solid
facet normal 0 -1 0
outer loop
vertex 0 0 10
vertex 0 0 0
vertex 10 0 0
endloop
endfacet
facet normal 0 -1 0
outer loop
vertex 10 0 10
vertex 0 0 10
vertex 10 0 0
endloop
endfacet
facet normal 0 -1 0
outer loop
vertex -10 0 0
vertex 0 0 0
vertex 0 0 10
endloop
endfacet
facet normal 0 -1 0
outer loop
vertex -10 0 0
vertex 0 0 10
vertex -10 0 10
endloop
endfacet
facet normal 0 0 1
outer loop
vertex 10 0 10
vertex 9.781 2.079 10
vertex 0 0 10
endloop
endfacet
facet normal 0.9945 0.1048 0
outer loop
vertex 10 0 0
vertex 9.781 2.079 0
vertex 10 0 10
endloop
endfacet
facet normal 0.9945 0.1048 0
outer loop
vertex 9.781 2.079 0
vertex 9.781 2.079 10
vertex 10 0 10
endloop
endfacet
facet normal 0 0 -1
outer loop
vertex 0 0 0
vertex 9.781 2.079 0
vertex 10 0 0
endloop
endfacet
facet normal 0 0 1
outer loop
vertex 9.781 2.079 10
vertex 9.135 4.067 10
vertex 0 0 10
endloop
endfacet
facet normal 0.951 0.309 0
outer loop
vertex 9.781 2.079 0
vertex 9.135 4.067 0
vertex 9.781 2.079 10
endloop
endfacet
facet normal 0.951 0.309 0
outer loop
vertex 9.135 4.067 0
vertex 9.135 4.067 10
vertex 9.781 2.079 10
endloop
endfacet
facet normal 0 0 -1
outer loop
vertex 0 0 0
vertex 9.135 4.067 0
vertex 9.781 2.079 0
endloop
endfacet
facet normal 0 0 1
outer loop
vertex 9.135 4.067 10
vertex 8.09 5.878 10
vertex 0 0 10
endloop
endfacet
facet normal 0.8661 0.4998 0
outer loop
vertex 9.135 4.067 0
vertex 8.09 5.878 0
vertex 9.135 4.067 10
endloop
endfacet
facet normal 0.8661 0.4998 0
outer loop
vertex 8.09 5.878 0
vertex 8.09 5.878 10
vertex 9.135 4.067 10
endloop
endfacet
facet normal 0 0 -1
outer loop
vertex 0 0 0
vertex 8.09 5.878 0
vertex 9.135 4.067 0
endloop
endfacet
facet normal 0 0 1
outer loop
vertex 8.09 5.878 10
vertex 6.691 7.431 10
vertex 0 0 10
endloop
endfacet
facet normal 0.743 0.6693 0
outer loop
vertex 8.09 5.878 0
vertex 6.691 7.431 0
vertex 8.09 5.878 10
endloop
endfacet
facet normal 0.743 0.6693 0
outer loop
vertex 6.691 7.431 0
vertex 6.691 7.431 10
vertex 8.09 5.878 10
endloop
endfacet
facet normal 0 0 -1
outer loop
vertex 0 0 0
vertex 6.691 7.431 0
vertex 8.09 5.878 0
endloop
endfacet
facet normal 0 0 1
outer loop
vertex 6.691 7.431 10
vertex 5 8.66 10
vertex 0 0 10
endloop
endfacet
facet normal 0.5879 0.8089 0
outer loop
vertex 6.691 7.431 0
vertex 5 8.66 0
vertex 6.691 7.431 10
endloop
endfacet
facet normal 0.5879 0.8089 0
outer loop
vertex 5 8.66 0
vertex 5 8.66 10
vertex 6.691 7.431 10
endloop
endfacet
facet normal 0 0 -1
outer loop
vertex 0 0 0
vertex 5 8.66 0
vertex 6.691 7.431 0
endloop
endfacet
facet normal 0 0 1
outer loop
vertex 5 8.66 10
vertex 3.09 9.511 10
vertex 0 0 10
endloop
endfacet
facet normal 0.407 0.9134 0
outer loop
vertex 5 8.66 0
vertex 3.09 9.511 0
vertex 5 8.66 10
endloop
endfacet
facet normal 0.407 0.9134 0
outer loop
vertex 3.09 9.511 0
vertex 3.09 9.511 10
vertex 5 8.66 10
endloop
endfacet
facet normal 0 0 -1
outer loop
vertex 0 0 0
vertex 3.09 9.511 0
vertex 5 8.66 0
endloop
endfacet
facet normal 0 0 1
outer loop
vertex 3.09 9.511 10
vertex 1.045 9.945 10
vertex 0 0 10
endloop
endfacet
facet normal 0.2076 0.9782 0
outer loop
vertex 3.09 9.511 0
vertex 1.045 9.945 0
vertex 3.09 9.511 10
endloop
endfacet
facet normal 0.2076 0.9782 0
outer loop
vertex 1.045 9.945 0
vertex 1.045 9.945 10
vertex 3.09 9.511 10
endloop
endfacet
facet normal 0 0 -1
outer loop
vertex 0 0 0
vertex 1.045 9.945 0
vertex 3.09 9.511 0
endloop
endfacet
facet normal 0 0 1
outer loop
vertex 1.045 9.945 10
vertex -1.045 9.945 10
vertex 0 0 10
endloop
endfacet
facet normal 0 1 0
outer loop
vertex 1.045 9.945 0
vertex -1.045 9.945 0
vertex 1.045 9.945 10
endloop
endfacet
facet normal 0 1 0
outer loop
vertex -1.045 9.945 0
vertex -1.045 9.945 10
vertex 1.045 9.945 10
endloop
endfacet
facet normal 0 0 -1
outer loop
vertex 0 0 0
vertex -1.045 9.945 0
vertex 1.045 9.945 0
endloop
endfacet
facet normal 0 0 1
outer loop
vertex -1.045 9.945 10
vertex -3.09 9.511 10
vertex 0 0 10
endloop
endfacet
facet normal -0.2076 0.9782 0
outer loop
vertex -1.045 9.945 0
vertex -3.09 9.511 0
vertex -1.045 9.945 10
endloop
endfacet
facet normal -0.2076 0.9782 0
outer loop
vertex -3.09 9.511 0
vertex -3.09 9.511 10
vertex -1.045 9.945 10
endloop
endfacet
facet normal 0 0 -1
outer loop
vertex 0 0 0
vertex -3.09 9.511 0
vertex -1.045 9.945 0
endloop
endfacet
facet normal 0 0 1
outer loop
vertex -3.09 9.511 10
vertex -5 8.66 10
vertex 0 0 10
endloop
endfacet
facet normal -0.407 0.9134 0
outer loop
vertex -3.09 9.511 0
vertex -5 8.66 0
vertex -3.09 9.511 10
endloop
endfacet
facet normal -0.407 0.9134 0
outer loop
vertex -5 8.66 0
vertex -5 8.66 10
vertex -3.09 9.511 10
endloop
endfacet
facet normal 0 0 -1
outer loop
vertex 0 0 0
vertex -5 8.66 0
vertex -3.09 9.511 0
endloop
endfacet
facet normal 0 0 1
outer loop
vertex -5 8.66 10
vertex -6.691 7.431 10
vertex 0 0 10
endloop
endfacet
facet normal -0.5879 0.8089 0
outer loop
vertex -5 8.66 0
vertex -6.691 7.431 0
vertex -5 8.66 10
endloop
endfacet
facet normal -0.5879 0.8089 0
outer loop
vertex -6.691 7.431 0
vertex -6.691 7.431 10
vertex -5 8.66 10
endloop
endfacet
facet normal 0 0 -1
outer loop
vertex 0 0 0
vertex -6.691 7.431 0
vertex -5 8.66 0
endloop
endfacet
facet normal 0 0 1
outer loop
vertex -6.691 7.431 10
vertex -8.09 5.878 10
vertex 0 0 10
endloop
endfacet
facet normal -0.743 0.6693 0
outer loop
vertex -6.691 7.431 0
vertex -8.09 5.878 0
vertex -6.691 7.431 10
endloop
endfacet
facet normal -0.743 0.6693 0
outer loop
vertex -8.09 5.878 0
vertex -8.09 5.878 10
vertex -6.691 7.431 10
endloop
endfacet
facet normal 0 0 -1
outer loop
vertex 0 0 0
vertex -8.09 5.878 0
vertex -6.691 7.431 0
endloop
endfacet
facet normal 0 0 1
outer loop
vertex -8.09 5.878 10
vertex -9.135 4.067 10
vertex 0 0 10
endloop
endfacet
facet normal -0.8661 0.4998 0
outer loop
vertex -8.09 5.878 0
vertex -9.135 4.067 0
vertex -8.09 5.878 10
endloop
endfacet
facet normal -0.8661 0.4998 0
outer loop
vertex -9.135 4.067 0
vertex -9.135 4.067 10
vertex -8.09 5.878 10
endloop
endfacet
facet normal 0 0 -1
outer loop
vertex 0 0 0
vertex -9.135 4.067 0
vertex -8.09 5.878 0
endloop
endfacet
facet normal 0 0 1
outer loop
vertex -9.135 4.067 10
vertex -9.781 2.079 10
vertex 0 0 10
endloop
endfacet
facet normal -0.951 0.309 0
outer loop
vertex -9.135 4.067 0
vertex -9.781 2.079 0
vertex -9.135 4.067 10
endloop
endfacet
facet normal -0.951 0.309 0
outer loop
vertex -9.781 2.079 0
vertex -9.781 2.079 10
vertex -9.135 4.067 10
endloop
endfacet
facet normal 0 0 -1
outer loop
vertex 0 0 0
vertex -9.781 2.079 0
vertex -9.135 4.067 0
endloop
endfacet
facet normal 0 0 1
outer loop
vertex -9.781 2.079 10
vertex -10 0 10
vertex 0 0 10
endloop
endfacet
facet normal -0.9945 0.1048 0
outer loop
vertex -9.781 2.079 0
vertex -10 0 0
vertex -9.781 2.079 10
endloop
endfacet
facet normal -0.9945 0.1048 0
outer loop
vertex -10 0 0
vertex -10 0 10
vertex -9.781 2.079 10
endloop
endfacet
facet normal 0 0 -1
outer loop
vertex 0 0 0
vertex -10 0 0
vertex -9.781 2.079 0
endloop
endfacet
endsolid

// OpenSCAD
// model26: rotate_extrude with 2D shape
rotate_extrude(angle = 180) {
    square(10);
}
